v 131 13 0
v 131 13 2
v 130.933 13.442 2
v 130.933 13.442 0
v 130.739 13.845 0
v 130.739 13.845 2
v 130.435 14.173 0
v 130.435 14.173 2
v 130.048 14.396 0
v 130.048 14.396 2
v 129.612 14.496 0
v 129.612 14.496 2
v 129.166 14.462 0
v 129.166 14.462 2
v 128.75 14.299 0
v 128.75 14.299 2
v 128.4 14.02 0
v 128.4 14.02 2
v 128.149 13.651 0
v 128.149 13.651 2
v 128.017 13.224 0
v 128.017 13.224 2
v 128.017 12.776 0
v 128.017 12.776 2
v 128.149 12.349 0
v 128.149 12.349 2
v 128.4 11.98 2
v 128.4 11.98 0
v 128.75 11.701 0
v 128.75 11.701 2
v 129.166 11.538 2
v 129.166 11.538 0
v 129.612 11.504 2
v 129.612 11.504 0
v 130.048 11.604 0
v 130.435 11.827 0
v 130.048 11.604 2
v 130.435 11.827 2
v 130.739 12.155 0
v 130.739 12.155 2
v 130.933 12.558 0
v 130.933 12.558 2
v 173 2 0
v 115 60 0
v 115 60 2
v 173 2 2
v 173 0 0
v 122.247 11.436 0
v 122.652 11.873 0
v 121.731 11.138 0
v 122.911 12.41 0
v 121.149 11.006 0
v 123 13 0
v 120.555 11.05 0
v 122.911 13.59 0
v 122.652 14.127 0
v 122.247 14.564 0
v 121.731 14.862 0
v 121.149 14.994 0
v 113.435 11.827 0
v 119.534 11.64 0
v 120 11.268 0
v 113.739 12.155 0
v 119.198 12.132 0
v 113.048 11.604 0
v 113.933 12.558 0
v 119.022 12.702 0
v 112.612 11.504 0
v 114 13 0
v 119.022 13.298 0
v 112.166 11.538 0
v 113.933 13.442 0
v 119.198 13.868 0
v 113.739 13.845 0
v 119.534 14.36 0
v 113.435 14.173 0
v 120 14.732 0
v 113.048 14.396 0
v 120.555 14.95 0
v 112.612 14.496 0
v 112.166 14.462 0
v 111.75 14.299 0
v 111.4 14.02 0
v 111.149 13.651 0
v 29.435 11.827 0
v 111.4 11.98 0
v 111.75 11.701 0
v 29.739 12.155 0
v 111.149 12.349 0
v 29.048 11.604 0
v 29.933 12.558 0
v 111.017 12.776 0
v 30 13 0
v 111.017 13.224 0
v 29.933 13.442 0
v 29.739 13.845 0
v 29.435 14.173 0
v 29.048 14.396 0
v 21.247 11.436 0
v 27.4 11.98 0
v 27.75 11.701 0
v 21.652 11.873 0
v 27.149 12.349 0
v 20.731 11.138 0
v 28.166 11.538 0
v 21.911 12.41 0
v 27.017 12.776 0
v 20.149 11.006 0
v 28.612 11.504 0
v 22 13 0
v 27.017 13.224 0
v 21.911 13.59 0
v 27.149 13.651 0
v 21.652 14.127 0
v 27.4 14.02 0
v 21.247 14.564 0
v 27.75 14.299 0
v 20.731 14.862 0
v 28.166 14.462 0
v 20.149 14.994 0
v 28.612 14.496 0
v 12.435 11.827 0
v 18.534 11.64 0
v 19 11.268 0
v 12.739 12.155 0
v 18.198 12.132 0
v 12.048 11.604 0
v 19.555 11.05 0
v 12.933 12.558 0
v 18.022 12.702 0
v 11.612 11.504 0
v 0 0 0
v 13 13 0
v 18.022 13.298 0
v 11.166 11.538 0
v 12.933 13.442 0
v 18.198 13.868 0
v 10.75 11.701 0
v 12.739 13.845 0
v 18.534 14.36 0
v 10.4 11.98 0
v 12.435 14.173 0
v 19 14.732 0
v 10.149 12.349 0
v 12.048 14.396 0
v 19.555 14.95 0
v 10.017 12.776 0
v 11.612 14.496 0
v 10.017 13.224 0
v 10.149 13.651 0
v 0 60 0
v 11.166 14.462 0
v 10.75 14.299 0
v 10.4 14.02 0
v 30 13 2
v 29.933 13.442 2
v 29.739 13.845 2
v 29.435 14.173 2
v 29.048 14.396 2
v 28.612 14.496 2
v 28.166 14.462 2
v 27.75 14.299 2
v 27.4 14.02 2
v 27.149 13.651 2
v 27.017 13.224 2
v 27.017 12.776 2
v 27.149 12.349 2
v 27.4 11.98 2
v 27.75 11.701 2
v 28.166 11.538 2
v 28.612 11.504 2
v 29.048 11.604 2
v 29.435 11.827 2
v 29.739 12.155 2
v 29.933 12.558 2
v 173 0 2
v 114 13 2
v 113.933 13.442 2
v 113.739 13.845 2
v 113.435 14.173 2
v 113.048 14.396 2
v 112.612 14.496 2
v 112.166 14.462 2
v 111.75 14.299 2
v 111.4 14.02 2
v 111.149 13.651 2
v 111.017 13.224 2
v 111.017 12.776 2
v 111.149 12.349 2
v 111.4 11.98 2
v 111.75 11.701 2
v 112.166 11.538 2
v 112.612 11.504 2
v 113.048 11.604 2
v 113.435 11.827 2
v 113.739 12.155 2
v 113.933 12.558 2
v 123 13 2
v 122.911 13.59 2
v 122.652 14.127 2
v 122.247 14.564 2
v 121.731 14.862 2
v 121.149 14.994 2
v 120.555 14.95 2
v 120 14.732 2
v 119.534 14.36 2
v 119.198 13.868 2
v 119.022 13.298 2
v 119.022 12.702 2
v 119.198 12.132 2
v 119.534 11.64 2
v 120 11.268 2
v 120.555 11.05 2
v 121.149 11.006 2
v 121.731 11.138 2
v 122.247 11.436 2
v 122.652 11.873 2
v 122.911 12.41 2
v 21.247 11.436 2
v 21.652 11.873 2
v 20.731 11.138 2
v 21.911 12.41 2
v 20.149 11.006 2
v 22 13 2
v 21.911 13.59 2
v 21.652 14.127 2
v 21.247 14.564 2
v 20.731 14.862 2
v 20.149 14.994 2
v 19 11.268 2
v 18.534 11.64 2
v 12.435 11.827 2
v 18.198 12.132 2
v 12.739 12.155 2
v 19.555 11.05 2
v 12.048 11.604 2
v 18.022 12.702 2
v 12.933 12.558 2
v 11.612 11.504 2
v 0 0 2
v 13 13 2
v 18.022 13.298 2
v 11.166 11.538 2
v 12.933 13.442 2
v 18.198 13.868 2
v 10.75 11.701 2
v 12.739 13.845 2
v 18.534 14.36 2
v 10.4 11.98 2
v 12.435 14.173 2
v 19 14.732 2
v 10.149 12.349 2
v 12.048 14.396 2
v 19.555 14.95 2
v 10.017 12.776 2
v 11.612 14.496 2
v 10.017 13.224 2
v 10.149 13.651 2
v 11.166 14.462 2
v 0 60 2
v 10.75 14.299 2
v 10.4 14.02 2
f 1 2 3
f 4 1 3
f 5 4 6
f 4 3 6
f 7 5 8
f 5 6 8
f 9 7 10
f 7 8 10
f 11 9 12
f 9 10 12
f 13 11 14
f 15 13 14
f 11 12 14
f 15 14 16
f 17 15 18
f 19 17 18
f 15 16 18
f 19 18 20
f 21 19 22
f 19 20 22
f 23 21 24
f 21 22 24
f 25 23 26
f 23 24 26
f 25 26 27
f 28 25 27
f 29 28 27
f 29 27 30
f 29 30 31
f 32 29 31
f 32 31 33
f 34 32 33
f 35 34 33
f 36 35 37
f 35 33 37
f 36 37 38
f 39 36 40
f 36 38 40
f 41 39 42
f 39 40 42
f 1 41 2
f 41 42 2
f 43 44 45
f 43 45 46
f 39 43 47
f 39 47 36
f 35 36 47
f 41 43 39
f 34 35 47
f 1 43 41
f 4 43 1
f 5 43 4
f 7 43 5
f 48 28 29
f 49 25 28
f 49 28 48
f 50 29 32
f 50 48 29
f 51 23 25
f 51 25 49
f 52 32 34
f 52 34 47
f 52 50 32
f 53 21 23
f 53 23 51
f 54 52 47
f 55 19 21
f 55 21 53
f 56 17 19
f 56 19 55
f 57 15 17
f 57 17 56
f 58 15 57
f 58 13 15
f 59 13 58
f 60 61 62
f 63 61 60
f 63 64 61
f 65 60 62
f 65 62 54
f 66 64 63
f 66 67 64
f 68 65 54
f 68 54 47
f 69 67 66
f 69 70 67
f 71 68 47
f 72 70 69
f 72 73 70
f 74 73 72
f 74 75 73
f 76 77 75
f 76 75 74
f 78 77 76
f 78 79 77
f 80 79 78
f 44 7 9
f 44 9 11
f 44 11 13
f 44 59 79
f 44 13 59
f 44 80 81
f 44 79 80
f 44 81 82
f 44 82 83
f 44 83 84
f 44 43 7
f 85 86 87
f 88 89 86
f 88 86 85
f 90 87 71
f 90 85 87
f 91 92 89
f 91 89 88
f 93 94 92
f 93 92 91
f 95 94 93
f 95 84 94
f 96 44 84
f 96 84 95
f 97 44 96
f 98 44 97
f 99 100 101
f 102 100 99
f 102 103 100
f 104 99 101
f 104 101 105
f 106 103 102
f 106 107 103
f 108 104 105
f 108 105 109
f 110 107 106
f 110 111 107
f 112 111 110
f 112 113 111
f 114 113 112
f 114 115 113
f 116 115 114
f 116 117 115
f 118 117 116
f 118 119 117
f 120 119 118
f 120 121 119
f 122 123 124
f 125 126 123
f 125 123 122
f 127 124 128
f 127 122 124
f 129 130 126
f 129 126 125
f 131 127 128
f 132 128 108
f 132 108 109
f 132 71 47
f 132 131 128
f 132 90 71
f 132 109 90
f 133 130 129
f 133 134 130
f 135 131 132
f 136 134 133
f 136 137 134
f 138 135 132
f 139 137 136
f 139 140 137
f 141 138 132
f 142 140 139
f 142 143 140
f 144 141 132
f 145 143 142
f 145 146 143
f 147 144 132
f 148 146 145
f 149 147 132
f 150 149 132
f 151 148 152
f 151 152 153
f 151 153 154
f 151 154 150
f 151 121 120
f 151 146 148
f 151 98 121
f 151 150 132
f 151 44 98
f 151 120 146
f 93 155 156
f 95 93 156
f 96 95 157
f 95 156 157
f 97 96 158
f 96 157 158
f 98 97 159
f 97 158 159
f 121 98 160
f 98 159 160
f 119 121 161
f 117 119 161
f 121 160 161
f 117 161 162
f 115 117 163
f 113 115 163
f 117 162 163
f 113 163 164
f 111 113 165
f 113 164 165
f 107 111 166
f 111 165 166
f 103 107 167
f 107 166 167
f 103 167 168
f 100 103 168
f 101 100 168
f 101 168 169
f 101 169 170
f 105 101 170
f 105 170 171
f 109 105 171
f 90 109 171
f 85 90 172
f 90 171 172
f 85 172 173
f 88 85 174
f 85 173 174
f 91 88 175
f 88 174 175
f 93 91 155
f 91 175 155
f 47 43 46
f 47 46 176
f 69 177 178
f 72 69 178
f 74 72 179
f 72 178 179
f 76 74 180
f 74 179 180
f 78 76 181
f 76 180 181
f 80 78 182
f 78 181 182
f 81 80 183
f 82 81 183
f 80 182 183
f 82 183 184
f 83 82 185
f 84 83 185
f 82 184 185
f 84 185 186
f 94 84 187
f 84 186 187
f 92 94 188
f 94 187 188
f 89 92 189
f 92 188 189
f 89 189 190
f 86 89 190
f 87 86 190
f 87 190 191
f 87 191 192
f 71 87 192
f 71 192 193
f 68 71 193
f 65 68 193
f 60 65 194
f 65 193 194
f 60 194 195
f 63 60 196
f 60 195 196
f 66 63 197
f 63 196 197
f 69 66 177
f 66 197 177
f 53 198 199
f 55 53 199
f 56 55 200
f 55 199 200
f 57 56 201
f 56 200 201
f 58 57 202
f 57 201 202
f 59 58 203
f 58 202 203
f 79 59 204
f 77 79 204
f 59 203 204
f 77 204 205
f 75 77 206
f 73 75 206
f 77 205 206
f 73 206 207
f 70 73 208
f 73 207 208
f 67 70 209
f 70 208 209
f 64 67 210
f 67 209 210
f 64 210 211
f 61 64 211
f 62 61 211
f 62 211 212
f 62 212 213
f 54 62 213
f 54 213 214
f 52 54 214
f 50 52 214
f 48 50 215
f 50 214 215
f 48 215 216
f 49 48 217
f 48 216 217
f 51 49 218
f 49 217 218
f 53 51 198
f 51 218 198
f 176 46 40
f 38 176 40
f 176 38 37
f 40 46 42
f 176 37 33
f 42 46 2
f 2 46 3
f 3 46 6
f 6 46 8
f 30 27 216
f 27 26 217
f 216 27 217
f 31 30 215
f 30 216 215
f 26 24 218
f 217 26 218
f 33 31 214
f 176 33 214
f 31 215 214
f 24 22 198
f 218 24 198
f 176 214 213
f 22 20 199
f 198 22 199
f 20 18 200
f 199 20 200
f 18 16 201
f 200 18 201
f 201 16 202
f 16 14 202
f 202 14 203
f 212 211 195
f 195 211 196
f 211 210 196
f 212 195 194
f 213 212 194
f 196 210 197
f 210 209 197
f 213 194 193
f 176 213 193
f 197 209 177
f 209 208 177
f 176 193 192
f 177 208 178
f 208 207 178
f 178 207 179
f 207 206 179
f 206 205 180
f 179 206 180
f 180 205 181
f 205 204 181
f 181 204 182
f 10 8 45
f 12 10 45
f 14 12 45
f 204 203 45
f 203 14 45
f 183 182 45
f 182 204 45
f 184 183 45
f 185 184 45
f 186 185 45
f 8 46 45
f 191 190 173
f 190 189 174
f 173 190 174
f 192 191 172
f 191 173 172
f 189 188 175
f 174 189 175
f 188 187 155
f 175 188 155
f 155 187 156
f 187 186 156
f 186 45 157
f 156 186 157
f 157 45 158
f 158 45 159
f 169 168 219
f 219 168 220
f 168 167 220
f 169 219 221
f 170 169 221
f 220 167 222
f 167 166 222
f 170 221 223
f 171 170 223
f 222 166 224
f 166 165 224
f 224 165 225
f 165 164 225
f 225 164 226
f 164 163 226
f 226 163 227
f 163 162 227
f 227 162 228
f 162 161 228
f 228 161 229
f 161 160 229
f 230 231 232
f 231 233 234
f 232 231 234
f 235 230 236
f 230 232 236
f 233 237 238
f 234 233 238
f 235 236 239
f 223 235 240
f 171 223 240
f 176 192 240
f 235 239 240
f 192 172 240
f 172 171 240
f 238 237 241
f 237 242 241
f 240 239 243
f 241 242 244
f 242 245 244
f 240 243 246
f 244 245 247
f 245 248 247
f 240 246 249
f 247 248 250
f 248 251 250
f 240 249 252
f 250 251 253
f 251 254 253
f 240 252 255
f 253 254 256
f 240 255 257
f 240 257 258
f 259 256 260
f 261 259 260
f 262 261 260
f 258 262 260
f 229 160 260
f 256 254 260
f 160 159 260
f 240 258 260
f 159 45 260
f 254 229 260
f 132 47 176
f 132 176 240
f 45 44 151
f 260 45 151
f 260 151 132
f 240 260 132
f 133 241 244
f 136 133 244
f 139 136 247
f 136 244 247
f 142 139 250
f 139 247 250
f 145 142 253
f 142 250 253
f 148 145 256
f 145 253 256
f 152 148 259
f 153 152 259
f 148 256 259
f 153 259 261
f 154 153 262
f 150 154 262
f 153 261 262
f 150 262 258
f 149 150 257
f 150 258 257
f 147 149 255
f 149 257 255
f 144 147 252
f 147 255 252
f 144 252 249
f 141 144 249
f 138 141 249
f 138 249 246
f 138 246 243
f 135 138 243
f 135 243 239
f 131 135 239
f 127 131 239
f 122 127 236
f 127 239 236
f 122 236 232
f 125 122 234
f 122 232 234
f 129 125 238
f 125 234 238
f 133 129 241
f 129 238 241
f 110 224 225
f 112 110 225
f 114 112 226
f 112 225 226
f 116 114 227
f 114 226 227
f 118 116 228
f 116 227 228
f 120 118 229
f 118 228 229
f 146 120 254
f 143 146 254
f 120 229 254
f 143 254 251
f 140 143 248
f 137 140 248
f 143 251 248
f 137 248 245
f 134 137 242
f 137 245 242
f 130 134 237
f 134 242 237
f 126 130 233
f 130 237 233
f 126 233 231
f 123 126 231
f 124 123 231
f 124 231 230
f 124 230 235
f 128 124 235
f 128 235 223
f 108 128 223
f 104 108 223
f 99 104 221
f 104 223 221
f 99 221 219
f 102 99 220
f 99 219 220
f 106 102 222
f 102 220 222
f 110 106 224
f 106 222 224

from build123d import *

# Parameters (mm, degrees)
BOSS_EXTRUDE1_DEPTH = 2
SKETCH4_R           = 2
SKETCH4_R_2         = 1.5
CUT_EXTRUDE1_DEPTH  = 2


with BuildPart() as part:
    # Sketch2 → Boss-Extrude1 (new body)
    with BuildSketch(Plane.XY):
        Polygon((0, 0), (0, 2), (0, 60), (43, 60), (115, 60), (173, 2), (173, 0), align=None)
    extrude(amount=BOSS_EXTRUDE1_DEPTH)

    # Sketch4 → Cut-Extrude1 (cut)
    with BuildSketch(Plane.XY.offset(2)):
        with Locations((20, 13)):
            Circle(SKETCH4_R)
        with Locations((121, 13)):
            Circle(SKETCH4_R)
        with Locations((28.5, 13)):
            Circle(SKETCH4_R_2)
        with Locations((112.5, 13)):
            Circle(SKETCH4_R_2)
        with Locations((129.5, 13)):
            Circle(SKETCH4_R_2)
        with Locations((11.5, 13)):
            Circle(SKETCH4_R_2)
    extrude(amount=-CUT_EXTRUDE1_DEPTH, mode=Mode.SUBTRACT)


solid = part.part
